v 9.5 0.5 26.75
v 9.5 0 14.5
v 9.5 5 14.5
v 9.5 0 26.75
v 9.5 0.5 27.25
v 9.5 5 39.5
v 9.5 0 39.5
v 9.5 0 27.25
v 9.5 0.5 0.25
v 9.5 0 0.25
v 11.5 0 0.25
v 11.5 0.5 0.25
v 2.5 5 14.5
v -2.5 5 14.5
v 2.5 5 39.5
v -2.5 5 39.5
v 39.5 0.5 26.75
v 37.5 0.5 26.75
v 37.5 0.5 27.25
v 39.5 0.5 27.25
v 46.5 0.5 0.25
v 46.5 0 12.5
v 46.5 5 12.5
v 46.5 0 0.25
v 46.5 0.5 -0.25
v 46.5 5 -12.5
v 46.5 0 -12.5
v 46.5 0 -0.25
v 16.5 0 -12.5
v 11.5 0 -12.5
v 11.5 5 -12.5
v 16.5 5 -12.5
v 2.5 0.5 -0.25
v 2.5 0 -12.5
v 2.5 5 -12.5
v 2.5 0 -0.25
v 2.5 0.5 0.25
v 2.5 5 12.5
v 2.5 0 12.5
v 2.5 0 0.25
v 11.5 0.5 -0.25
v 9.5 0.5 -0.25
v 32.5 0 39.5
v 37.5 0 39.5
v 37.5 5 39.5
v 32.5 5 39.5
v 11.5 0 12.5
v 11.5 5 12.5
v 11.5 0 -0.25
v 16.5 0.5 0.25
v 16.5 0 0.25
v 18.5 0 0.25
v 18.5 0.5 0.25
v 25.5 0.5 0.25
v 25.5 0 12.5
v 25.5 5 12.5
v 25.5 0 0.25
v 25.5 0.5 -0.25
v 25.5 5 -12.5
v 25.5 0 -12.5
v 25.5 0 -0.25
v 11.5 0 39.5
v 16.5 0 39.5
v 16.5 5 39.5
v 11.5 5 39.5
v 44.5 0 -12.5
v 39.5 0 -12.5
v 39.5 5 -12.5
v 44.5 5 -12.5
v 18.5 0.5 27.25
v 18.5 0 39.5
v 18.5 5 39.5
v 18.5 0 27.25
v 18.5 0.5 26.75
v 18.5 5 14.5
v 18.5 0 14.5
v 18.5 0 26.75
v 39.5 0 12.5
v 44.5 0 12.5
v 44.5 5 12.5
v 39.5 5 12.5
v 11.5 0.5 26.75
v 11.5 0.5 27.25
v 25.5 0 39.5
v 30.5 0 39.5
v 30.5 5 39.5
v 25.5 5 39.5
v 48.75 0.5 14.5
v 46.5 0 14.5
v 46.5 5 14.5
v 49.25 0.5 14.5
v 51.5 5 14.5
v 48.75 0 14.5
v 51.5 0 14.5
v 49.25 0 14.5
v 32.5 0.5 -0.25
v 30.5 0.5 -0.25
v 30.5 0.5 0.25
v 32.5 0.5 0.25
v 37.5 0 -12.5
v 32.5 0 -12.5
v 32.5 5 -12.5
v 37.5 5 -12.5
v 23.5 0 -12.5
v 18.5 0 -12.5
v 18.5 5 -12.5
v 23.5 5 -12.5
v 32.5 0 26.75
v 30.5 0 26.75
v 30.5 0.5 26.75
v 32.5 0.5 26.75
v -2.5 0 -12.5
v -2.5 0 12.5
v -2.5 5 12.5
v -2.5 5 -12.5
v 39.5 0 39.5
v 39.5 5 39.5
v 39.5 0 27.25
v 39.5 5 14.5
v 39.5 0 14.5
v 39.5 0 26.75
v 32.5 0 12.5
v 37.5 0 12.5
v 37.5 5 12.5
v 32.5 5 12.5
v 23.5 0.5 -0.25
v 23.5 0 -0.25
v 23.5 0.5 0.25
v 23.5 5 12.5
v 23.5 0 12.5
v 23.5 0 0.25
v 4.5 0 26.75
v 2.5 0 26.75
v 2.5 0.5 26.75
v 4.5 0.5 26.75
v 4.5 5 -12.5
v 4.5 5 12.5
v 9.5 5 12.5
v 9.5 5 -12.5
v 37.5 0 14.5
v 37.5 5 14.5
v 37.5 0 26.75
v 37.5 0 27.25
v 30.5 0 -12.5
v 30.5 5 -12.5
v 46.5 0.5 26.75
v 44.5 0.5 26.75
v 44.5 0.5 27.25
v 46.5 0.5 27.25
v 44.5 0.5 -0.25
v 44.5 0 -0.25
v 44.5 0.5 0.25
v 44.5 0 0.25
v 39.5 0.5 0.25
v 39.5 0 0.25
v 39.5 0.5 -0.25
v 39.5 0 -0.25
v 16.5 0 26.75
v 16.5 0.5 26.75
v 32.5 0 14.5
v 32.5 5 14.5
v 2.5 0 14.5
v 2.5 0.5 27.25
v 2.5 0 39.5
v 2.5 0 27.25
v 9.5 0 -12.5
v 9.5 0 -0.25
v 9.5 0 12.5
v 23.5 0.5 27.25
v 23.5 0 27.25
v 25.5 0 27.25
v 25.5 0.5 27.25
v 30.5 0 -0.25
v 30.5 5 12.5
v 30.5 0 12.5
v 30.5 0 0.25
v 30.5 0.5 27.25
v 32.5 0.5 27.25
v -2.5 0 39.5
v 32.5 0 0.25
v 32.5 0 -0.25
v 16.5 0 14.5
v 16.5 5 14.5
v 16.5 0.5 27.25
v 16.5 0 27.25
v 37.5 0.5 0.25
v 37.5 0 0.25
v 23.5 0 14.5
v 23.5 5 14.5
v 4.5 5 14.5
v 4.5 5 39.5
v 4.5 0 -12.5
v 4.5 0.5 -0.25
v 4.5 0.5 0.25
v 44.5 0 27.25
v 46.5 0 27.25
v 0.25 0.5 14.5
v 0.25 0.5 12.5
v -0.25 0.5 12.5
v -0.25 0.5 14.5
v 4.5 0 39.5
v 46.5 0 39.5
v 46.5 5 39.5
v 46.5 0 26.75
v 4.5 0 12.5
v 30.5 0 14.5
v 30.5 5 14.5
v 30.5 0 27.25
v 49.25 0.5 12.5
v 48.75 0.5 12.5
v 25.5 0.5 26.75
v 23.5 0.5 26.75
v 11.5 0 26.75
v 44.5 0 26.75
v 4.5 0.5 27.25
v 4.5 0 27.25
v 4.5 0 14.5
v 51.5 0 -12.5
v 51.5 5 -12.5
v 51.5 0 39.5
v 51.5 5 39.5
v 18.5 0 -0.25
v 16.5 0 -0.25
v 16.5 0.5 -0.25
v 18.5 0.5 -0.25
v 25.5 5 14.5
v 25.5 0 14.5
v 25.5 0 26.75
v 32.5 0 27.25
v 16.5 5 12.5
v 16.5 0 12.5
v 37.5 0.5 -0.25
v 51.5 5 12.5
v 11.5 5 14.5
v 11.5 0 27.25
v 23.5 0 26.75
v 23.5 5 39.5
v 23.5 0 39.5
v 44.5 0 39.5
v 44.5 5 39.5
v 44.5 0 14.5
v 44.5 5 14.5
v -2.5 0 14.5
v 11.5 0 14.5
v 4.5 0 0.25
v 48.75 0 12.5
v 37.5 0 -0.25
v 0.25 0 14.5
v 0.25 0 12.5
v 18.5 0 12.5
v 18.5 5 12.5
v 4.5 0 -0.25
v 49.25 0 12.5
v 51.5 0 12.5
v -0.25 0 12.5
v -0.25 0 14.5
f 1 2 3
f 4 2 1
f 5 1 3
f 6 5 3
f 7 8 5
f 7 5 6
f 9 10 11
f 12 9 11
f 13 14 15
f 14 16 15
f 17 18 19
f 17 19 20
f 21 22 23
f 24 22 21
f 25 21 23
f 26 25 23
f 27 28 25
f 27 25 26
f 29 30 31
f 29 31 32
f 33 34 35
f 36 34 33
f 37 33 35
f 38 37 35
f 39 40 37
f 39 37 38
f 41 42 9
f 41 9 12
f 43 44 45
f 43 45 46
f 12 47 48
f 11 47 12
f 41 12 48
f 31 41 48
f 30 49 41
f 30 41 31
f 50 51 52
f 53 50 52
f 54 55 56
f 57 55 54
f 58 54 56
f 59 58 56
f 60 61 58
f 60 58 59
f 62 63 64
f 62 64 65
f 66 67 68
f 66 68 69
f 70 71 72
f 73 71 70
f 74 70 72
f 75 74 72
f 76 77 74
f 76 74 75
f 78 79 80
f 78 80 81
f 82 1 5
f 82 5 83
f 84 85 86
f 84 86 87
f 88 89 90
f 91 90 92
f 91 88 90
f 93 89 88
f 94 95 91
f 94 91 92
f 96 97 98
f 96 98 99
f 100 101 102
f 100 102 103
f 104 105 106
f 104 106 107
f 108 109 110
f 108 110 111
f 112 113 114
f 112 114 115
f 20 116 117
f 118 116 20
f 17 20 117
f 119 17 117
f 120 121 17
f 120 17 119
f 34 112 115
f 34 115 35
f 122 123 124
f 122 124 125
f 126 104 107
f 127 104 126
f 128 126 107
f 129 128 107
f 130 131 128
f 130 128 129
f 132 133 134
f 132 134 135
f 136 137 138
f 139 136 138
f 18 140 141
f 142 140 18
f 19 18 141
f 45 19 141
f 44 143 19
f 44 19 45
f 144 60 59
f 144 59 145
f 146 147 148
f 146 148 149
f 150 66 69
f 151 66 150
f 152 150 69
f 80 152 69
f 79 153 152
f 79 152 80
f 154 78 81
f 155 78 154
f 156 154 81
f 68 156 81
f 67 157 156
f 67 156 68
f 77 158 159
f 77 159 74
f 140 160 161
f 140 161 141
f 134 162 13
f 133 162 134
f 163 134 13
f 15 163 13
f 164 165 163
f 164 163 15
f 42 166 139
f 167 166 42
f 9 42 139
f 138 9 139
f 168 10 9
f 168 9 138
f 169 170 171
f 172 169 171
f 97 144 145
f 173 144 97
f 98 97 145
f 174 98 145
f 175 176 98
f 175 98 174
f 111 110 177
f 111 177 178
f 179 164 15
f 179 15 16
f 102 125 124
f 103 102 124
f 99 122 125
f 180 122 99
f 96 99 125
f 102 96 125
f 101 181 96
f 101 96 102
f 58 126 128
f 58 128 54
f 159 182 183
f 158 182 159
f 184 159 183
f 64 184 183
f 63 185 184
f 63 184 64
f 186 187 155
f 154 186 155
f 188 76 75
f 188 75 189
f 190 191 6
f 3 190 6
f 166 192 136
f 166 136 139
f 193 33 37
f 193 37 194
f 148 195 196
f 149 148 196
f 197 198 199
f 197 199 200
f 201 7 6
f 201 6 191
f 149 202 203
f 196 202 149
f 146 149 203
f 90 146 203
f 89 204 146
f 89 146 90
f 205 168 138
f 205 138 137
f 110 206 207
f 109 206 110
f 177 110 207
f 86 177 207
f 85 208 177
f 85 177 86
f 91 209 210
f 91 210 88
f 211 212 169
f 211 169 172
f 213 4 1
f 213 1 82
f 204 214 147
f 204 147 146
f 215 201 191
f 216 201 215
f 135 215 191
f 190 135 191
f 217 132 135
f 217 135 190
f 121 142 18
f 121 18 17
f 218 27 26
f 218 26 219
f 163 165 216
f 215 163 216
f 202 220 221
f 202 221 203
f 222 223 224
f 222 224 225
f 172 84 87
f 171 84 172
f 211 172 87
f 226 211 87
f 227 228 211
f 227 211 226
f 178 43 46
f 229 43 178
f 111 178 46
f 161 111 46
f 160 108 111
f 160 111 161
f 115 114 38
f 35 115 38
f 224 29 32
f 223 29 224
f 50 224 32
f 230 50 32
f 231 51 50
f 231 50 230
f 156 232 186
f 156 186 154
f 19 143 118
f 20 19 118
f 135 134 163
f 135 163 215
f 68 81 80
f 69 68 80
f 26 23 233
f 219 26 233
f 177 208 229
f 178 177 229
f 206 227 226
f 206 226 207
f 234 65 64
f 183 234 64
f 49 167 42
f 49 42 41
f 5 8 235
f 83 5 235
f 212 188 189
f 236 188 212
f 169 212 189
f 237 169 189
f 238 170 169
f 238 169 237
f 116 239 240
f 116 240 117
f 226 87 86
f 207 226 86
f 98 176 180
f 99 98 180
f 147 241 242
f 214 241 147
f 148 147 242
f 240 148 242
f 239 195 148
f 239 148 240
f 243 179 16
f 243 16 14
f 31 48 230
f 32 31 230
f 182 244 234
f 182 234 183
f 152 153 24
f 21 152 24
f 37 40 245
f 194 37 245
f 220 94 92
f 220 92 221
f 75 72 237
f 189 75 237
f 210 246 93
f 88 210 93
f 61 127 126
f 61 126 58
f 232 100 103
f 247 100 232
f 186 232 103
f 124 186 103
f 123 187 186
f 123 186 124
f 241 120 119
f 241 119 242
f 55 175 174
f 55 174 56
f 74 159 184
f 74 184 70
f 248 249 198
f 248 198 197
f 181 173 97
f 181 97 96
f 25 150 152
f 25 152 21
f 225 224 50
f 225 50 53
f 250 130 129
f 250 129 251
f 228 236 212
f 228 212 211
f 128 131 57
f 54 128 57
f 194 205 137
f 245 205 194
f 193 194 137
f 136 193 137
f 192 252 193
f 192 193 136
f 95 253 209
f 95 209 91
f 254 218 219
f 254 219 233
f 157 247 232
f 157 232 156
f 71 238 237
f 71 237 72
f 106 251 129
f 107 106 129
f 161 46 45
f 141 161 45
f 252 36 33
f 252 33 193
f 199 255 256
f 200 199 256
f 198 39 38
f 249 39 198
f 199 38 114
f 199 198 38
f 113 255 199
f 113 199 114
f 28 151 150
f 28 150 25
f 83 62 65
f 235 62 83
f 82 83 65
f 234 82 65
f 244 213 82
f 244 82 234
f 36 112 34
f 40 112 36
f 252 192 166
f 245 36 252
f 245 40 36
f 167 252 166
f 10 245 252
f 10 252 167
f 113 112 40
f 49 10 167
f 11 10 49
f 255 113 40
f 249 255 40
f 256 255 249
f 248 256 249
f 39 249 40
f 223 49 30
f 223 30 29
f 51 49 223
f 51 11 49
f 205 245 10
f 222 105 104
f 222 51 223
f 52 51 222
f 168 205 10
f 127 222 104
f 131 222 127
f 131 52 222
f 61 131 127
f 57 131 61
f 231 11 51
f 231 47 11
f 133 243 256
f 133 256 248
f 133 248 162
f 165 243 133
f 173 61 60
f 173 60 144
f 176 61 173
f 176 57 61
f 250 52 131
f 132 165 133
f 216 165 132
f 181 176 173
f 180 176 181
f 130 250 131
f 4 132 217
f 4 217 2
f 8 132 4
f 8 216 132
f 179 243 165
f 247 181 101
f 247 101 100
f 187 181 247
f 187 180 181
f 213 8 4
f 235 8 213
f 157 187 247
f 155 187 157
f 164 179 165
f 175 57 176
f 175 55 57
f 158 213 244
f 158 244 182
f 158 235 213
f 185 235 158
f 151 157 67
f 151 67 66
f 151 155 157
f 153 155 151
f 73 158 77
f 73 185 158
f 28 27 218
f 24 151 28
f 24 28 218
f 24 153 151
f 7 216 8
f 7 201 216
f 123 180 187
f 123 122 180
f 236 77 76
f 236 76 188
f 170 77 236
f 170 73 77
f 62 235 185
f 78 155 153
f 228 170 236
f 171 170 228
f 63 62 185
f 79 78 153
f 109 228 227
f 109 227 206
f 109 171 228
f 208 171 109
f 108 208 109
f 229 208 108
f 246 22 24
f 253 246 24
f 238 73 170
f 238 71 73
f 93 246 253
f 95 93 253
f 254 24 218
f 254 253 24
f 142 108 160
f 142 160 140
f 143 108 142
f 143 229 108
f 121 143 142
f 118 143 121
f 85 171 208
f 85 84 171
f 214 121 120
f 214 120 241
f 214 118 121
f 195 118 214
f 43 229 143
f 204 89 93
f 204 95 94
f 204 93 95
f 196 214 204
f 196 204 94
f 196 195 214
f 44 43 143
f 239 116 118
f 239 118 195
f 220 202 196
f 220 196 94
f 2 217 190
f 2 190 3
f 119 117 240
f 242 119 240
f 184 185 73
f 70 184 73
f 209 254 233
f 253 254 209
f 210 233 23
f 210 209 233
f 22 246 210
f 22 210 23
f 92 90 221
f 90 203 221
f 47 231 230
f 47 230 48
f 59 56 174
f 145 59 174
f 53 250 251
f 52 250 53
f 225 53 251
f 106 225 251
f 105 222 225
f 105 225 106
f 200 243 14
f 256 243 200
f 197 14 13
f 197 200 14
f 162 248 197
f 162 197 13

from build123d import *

# Parameters (mm, degrees)
F0_W     = 2
F0_H     = 0.5
F0_W_2   = 0.5
F0_H_2   = 2
F1_DEPTH = 5
F2_W     = 2
F2_H     = 4.5
F2_H_2   = 0.5
F3_DEPTH = 41.751
F4_W     = 4.5
F4_H     = 2
F4_W_2   = 0.5
F5_DEPTH = 51.751


with BuildPart() as f1:
    # F0 (on Front) → F1 (new body)
    with BuildSketch(Plane.XZ):
        Polygon((-2.5, -12.5), (2.5, -12.5), (2.5, -0.25), (2.5, 0.25), (2.5, 12.5), (0.25, 12.5), (-0.25, 12.5), (-2.5, 12.5), align=None)
        with Locations((3.5, 0)):
            Rectangle(F0_W, F0_H)
        Polygon((4.5, 0.25), (4.5, -0.25), (4.5, -12.5), (9.5, -12.5), (9.5, -0.25), (9.5, 0.25), (9.5, 12.5), (7.25, 12.5), (6.75, 12.5), (4.5, 12.5), align=None)
        with Locations((0, 13.5)):
            Rectangle(F0_W_2, F0_H_2)
        Polygon((-2.5, 14.5), (-0.25, 14.5), (0.25, 14.5), (2.5, 14.5), (2.5, 26.75), (2.5, 27.25), (2.5, 39.5), (0.25, 39.5), (-0.25, 39.5), (-2.5, 39.5), align=None)
        with Locations((10.5, 0)):
            Rectangle(F0_W, F0_H)
        Polygon((4.5, 14.5), (6.75, 14.5), (7.25, 14.5), (9.5, 14.5), (9.5, 26.75), (9.5, 27.25), (9.5, 39.5), (7.25, 39.5), (6.75, 39.5), (4.5, 39.5), (4.5, 27.25), (4.5, 26.75), align=None)
        Polygon((11.5, 0.25), (11.5, -0.25), (11.5, -12.5), (16.5, -12.5), (16.5, -0.25), (16.5, 0.25), (16.5, 12.5), (14.25, 12.5), (13.75, 12.5), (11.5, 12.5), align=None)
        with Locations((3.5, 27)):
            Rectangle(F0_W, F0_H)
        with Locations((0, 40.5)):
            Rectangle(F0_W_2, F0_H_2)
        with Locations((10.5, 27)):
            Rectangle(F0_W, F0_H)
        with Locations((17.5, 0)):
            Rectangle(F0_W, F0_H)
        Polygon((11.5, 27.25), (11.5, 26.75), (11.5, 14.5), (13.75, 14.5), (14.25, 14.5), (16.5, 14.5), (16.5, 26.75), (16.5, 27.25), (16.5, 39.5), (14.25, 39.5), (13.75, 39.5), (11.5, 39.5), align=None)
        Polygon((18.5, 0.25), (18.5, -0.25), (18.5, -12.5), (23.5, -12.5), (23.5, -0.25), (23.5, 0.25), (23.5, 12.5), (21.25, 12.5), (20.75, 12.5), (18.5, 12.5), align=None)
        with Locations((7, 40.5)):
            Rectangle(F0_W_2, F0_H_2)
        with Locations((14, 40.5)):
            Rectangle(F0_W_2, F0_H_2)
        with Locations((17.5, 27)):
            Rectangle(F0_W, F0_H)
        with Locations((24.5, 0)):
            Rectangle(F0_W, F0_H)
        Polygon((18.5, 27.25), (18.5, 26.75), (18.5, 14.5), (20.75, 14.5), (21.25, 14.5), (23.5, 14.5), (23.5, 26.75), (23.5, 27.25), (23.5, 39.5), (21.25, 39.5), (20.75, 39.5), (18.5, 39.5), align=None)
        Polygon((25.5, 0.25), (25.5, -0.25), (25.5, -12.5), (30.5, -12.5), (30.5, -0.25), (30.5, 0.25), (30.5, 12.5), (28.25, 12.5), (27.75, 12.5), (25.5, 12.5), align=None)
        with Locations((21, 40.5)):
            Rectangle(F0_W_2, F0_H_2)
        with Locations((24.5, 27)):
            Rectangle(F0_W, F0_H)
        with Locations((31.5, 0)):
            Rectangle(F0_W, F0_H)
        Polygon((25.5, 27.25), (25.5, 26.75), (25.5, 14.5), (27.75, 14.5), (28.25, 14.5), (30.5, 14.5), (30.5, 26.75), (30.5, 27.25), (30.5, 39.5), (28.25, 39.5), (27.75, 39.5), (25.5, 39.5), align=None)
        Polygon((32.5, 0.25), (32.5, -0.25), (32.5, -12.5), (37.5, -12.5), (37.5, -0.25), (37.5, 0.25), (37.5, 12.5), (35.25, 12.5), (34.75, 12.5), (32.5, 12.5), align=None)
        with Locations((28, 40.5)):
            Rectangle(F0_W_2, F0_H_2)
        with Locations((31.5, 27)):
            Rectangle(F0_W, F0_H)
        with Locations((38.5, 0)):
            Rectangle(F0_W, F0_H)
        Polygon((32.5, 27.25), (32.5, 26.75), (32.5, 14.5), (34.75, 14.5), (35.25, 14.5), (37.5, 14.5), (37.5, 26.75), (37.5, 27.25), (37.5, 39.5), (35.25, 39.5), (34.75, 39.5), (32.5, 39.5), align=None)
        Polygon((39.5, 0.25), (39.5, -0.25), (39.5, -12.5), (44.5, -12.5), (44.5, -0.25), (44.5, 0.25), (44.5, 12.5), (42.25, 12.5), (41.75, 12.5), (39.5, 12.5), align=None)
        with Locations((35, 40.5)):
            Rectangle(F0_W_2, F0_H_2)
        with Locations((38.5, 27)):
            Rectangle(F0_W, F0_H)
        with Locations((45.5, 0)):
            Rectangle(F0_W, F0_H)
        Polygon((39.5, 27.25), (39.5, 26.75), (39.5, 14.5), (41.75, 14.5), (42.25, 14.5), (44.5, 14.5), (44.5, 26.75), (44.5, 27.25), (44.5, 39.5), (42.25, 39.5), (41.75, 39.5), (39.5, 39.5), align=None)
        Polygon((46.5, 0.25), (46.5, -0.25), (46.5, -12.5), (51.5, -12.5), (51.5, -0.25), (51.5, 0.25), (51.5, 12.5), (49.25, 12.5), (48.75, 12.5), (46.5, 12.5), align=None)
        with Locations((42, 40.5)):
            Rectangle(F0_W_2, F0_H_2)
        with Locations((45.5, 27)):
            Rectangle(F0_W, F0_H)
        with Locations((49, 13.5)):
            Rectangle(F0_W_2, F0_H_2)
        with Locations((52.5, 0)):
            Rectangle(F0_W, F0_H)
        Polygon((46.5, 27.25), (46.5, 26.75), (46.5, 14.5), (48.75, 14.5), (49.25, 14.5), (51.5, 14.5), (51.5, 26.75), (51.5, 27.25), (51.5, 39.5), (49.25, 39.5), (48.75, 39.5), (46.5, 39.5), align=None)
        with Locations((49, 40.5)):
            Rectangle(F0_W_2, F0_H_2)
        with Locations((52.5, 27)):
            Rectangle(F0_W, F0_H)
    extrude(amount=-F1_DEPTH)

    # F2 (on face) → F3 (cut, through all)
    with BuildSketch(Plane(origin=(0, 0, -0.25), x_dir=(1, 0, 0), z_dir=(0, 0, -1))):
        with Locations((3.5, -2.75)):
            Rectangle(F2_W, F2_H)
        with Locations((10.5, -2.75)):
            Rectangle(F2_W, F2_H)
        with Locations((17.5, -2.75)):
            Rectangle(F2_W, F2_H)
        with Locations((24.5, -2.75)):
            Rectangle(F2_W, F2_H)
        with Locations((31.5, -2.75)):
            Rectangle(F2_W, F2_H)
        with Locations((38.5, -2.75)):
            Rectangle(F2_W, F2_H)
        with Locations((45.5, -2.75)):
            Rectangle(F2_W, F2_H)
        with Locations((52.5, -2.75)):
            Rectangle(F2_W, F2_H)
        with Locations((52.5, -0.25)):
            Rectangle(F2_W, F2_H_2)
    extrude(amount=-F3_DEPTH, mode=Mode.SUBTRACT)

    # F4 (on face) → F5 (cut, through all)
    with BuildSketch(Plane.YZ.offset(49.25)):
        with Locations((2.75, 40.5)):
            Rectangle(F4_W, F4_H)
        with Locations((0.25, 40.5)):
            Rectangle(F4_W_2, F4_H)
        with Locations((2.75, 13.5)):
            Rectangle(F4_W, F4_H)
    extrude(amount=-F5_DEPTH, mode=Mode.SUBTRACT)


solid = f1.part
